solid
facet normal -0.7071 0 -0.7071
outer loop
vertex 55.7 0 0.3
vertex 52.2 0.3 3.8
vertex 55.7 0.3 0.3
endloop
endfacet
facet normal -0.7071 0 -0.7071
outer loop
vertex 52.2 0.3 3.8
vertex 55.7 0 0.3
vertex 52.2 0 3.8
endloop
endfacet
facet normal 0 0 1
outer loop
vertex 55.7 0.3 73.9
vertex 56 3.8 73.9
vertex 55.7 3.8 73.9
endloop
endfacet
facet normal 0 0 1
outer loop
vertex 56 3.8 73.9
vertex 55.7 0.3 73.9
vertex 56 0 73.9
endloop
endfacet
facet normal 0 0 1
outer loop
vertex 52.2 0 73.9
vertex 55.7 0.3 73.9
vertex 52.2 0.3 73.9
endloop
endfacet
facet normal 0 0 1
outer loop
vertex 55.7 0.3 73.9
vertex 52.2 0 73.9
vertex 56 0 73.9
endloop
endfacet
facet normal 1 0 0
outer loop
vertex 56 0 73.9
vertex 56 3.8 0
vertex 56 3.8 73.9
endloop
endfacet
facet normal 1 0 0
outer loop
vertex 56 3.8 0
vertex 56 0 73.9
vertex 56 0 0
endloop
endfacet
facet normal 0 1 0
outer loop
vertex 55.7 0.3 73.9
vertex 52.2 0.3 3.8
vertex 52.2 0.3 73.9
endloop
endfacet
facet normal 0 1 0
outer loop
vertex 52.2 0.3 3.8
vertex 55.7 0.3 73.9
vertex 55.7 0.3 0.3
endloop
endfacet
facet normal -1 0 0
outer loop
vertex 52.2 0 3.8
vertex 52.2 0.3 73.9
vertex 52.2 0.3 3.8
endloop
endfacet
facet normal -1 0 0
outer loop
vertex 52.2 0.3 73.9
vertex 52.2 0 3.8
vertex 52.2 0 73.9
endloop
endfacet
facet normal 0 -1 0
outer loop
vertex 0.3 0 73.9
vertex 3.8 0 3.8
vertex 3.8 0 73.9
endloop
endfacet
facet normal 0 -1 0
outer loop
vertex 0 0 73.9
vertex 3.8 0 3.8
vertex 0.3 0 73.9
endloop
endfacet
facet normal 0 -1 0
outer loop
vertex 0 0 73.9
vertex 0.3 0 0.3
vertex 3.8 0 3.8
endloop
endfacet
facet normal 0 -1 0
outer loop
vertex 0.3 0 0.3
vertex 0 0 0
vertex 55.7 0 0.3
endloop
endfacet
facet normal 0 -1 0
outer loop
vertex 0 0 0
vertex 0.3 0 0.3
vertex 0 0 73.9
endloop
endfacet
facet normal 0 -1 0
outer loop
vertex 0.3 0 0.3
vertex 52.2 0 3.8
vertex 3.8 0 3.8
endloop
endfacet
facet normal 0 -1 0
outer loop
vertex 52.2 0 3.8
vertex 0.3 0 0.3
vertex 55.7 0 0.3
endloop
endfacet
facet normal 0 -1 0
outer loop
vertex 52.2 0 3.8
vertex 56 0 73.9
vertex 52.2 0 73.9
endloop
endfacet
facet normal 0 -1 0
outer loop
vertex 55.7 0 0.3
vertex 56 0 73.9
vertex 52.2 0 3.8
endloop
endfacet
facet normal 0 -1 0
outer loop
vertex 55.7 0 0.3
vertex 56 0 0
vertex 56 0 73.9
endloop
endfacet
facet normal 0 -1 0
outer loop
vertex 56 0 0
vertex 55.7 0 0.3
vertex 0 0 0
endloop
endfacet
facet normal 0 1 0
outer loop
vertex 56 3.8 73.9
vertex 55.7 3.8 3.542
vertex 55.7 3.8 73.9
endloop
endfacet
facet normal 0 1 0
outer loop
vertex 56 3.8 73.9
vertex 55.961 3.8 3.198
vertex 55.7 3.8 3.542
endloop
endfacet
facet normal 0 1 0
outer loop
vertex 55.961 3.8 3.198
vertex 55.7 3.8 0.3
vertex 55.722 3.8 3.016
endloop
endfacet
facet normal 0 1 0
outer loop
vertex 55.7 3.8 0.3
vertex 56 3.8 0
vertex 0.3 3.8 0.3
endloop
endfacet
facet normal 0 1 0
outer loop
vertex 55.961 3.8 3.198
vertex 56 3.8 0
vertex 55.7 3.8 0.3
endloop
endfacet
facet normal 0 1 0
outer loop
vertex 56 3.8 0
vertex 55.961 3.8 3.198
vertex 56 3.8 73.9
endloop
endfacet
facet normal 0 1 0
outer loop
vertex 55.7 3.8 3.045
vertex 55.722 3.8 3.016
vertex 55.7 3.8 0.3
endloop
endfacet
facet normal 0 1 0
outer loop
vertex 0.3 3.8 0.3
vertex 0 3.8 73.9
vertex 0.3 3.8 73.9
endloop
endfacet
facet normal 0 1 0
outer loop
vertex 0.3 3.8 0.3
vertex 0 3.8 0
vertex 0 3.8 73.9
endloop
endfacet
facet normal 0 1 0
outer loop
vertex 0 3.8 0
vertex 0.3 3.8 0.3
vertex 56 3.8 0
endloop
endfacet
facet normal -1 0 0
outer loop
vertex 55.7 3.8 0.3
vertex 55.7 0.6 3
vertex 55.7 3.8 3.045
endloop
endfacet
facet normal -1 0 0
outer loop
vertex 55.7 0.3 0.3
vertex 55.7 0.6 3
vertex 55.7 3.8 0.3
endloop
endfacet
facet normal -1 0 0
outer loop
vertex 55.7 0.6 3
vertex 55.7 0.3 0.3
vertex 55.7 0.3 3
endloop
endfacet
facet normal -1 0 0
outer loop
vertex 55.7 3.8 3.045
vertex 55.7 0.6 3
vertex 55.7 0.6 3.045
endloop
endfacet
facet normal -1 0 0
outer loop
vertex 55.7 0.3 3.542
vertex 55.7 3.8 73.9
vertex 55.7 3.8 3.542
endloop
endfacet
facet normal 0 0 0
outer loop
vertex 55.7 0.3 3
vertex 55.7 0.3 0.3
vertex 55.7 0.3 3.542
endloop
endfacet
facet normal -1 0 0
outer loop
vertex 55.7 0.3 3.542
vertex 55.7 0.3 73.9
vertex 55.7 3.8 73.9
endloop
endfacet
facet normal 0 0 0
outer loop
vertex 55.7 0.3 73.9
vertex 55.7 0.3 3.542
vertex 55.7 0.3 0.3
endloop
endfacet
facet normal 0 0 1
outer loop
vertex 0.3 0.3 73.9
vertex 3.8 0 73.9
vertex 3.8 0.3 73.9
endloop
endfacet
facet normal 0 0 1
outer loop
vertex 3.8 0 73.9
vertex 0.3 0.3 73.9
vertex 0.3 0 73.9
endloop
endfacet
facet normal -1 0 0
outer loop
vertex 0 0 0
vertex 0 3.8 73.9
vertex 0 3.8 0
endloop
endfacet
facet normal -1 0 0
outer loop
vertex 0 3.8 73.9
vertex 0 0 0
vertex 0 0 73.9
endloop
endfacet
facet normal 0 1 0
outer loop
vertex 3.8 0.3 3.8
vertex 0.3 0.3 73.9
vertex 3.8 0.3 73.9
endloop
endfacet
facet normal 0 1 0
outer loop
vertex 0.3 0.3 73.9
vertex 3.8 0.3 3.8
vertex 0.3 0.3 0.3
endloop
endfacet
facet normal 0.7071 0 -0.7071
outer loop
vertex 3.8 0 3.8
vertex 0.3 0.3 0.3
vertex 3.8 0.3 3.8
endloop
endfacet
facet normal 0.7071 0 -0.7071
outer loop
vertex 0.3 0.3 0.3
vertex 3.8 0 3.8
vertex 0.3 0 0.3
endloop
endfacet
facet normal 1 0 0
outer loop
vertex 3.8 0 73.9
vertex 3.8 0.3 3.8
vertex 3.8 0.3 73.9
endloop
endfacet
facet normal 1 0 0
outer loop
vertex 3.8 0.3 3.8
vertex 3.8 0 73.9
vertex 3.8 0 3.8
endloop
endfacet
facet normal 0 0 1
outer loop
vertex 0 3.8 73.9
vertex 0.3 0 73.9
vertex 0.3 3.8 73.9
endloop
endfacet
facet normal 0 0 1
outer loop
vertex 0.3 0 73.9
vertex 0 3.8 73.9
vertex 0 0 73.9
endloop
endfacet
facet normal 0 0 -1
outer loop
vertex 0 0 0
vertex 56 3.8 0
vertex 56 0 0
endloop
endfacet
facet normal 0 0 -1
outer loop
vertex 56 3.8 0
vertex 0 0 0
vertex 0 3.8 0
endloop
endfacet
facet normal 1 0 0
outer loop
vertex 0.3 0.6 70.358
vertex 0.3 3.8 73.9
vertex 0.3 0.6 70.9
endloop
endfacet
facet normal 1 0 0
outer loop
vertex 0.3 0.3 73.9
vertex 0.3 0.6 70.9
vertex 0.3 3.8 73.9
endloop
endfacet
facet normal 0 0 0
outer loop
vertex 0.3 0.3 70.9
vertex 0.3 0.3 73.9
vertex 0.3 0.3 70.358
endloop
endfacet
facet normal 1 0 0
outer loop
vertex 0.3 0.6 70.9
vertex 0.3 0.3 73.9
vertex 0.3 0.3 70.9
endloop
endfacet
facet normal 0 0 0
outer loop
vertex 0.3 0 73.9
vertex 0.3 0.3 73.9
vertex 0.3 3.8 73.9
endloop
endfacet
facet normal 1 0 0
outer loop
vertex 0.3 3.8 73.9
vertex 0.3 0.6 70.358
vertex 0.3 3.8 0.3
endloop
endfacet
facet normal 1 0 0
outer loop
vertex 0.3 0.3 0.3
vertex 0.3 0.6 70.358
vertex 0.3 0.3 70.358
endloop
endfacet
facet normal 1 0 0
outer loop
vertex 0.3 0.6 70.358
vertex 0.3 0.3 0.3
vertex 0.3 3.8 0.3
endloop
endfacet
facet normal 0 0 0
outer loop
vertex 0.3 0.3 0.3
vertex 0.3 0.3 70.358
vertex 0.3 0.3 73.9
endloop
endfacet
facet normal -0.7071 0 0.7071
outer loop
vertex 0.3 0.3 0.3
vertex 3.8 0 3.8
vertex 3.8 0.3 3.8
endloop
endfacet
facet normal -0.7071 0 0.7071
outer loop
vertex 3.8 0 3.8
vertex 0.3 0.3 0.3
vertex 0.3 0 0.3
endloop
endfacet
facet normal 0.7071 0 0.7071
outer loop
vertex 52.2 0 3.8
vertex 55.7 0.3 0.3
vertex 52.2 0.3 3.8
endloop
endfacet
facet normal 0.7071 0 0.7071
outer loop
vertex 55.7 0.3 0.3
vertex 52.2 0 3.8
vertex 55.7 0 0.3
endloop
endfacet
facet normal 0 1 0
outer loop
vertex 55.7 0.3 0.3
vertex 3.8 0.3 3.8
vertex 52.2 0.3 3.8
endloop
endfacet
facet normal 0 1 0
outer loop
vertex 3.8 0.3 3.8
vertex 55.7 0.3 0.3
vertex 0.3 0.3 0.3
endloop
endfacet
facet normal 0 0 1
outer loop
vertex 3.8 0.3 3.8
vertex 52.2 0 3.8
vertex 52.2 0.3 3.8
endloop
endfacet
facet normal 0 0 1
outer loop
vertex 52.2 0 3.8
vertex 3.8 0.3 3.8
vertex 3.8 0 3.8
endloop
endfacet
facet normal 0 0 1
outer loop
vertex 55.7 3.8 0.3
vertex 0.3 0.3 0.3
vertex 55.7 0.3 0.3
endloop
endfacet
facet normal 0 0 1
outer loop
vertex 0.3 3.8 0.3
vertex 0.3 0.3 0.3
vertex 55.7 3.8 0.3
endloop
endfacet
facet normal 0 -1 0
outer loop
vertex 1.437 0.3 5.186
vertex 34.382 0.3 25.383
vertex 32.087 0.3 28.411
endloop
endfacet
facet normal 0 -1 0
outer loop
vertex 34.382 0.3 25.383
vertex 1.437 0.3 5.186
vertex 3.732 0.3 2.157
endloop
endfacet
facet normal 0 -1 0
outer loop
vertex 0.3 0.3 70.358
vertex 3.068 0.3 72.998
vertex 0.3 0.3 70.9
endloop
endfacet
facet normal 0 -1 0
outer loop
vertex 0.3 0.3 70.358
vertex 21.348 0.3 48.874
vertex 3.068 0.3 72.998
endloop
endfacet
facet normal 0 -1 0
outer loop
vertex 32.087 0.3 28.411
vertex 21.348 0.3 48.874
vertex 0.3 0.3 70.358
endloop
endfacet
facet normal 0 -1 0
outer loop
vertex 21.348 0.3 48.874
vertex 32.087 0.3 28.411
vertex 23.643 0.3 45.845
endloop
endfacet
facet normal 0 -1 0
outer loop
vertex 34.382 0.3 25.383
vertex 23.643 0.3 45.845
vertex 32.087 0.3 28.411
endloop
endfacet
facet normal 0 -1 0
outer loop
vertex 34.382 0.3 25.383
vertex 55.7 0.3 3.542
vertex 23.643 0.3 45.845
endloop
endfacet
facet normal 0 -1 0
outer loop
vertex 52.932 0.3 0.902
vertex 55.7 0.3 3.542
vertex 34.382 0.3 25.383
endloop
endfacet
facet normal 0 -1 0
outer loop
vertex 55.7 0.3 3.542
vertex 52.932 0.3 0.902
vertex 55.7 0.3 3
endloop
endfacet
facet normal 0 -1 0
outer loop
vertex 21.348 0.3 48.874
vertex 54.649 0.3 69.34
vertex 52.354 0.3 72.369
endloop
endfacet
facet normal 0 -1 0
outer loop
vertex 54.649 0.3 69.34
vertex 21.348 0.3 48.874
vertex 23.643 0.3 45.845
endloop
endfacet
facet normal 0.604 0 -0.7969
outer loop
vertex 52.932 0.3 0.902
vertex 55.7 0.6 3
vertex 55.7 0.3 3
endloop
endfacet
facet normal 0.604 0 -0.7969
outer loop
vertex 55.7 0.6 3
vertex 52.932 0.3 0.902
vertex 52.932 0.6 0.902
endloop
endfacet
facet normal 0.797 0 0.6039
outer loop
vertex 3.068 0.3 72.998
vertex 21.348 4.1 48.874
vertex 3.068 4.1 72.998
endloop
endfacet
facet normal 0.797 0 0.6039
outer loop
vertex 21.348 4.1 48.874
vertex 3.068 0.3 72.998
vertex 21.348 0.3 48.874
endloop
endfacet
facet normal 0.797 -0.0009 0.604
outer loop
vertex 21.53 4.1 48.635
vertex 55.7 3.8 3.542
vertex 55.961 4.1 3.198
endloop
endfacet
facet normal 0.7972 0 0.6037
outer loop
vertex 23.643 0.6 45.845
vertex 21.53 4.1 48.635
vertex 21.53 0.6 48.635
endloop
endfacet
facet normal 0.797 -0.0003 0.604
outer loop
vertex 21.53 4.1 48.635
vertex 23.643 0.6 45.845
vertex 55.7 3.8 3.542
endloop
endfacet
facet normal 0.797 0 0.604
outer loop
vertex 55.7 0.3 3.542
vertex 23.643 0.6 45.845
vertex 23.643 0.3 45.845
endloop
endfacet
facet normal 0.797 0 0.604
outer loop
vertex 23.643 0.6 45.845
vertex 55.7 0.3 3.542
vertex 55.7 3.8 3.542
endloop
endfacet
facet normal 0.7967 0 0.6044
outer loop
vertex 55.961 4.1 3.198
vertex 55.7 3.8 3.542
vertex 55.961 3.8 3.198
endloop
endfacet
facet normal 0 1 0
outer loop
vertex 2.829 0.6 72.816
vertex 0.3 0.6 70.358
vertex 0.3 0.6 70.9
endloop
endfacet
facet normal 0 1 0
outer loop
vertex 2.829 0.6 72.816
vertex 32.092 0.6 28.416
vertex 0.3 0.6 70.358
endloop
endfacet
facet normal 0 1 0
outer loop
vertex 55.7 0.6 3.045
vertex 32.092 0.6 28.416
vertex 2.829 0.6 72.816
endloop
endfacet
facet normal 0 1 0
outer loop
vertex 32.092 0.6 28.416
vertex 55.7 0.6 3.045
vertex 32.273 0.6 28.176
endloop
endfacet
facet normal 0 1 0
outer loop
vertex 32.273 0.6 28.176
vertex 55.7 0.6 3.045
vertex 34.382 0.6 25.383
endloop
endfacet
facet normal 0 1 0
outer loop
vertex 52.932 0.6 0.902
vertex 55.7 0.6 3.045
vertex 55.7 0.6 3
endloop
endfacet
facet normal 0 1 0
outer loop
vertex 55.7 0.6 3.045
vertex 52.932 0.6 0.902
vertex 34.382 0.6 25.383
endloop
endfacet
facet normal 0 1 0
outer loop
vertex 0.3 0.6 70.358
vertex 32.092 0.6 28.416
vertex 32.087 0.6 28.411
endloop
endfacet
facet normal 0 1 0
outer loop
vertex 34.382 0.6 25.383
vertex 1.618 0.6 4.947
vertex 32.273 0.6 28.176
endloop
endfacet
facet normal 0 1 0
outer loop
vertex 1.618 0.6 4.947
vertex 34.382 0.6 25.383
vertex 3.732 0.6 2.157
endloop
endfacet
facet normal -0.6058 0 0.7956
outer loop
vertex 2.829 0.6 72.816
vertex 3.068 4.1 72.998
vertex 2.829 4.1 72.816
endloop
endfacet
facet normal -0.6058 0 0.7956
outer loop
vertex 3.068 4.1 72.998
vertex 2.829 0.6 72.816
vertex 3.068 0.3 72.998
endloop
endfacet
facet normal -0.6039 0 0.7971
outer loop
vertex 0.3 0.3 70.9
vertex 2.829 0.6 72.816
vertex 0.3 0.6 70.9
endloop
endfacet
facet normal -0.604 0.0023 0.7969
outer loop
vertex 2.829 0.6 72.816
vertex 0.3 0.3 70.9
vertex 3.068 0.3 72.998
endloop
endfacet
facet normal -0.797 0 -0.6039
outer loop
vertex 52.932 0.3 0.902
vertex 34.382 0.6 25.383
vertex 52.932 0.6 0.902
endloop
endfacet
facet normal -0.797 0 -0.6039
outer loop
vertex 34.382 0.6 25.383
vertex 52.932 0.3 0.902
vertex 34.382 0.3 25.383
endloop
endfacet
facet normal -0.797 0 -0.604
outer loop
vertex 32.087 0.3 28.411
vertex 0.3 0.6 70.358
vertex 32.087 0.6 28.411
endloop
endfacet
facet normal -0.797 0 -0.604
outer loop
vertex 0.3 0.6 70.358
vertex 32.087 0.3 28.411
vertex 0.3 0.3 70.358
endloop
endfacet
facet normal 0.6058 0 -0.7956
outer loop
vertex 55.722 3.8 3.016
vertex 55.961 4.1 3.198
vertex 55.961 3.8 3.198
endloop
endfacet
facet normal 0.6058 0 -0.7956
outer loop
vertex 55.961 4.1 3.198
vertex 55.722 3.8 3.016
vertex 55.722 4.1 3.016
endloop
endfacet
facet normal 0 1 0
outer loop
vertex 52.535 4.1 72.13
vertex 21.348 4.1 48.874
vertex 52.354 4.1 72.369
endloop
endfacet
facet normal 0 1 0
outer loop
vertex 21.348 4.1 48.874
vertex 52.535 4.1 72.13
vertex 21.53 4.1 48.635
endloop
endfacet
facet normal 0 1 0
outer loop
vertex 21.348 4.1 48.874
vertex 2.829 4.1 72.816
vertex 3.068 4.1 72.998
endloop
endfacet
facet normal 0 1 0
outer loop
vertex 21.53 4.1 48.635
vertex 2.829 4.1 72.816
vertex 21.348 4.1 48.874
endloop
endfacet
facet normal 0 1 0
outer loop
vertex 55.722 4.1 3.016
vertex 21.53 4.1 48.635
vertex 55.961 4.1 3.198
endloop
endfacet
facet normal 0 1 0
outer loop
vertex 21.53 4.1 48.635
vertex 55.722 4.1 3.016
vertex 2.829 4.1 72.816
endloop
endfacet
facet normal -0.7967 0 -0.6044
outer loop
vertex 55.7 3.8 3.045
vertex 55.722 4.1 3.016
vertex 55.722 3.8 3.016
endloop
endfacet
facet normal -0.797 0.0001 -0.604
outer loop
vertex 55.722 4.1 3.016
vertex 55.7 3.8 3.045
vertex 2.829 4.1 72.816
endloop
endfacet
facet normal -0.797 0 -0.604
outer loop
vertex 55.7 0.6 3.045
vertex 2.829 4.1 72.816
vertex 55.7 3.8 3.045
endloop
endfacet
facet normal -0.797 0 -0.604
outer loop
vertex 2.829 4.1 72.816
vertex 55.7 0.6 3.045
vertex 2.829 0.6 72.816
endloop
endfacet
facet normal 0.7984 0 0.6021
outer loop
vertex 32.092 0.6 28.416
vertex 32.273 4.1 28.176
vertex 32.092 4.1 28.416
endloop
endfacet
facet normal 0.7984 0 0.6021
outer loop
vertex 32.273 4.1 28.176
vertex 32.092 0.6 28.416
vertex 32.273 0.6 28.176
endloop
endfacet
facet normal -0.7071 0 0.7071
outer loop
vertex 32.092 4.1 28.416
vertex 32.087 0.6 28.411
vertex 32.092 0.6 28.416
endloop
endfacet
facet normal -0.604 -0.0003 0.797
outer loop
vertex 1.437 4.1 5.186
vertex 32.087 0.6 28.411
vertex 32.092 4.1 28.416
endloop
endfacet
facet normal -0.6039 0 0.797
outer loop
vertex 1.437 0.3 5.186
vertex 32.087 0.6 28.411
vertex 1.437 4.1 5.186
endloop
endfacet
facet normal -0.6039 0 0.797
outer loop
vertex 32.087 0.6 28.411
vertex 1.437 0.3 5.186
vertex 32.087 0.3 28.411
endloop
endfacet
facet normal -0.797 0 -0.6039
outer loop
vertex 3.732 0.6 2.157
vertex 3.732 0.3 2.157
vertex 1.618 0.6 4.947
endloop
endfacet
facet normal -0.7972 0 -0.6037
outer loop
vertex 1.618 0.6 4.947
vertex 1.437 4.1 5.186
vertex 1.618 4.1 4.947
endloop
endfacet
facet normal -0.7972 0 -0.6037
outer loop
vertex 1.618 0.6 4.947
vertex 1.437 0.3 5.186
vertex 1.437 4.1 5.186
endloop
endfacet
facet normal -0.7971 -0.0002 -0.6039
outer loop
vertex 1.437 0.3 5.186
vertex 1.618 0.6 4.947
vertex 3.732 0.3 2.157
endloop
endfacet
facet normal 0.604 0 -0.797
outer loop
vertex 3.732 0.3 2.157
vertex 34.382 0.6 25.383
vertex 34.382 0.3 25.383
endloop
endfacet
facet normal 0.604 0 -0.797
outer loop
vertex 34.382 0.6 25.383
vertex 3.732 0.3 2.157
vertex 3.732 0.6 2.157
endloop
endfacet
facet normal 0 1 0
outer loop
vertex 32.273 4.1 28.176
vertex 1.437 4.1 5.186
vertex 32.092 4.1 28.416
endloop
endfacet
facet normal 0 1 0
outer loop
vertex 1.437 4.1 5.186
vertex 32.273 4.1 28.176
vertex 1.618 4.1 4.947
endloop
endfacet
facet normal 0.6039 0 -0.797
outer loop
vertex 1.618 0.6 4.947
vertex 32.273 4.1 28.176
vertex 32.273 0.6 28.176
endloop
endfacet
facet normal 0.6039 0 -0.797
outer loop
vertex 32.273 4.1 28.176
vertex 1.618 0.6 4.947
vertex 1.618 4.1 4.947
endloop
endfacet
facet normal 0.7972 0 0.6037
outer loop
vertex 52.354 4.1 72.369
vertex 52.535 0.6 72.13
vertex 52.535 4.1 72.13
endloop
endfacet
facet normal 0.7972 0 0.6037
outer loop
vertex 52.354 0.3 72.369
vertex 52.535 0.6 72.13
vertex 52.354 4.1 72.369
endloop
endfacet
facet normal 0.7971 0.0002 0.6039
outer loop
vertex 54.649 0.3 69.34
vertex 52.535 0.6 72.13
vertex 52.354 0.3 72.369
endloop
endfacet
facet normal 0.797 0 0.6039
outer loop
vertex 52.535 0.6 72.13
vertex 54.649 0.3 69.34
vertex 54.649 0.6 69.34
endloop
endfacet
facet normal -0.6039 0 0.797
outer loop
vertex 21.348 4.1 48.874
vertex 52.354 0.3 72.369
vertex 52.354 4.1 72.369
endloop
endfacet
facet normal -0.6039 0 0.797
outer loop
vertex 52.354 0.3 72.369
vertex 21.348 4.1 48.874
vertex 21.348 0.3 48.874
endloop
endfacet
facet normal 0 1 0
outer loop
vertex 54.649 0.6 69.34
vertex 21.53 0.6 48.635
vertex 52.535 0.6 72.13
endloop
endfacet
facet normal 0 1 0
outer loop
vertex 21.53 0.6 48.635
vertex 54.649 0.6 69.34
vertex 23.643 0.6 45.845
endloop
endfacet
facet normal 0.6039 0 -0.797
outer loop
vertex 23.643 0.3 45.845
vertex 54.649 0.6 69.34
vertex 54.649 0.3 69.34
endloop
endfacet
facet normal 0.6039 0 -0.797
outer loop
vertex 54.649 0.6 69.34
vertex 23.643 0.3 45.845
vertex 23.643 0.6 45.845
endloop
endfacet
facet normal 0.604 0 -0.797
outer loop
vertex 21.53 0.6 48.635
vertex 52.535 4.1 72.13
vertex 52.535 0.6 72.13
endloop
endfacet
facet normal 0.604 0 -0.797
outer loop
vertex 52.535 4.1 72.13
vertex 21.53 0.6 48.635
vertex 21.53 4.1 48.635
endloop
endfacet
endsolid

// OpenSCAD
// file: ../hdim.scad
module hdim(x1 = 10, x2 = 20, y = 10, dimline_lenght = 9.0) 
{
    dimline_overlap = 0.5;
    dimline_width = 0.3;
    text_size = 2;
    tmp = 2*dimline_overlap+text_size/2;
    text_pos = dimline_lenght>0 ? tmp : -tmp; 
    dimline_abs = dimline_lenght>0 ? dimline_lenght : -dimline_lenght;
    
    color([0,0,0])
    {
        translate([x1,y-dimline_lenght/2,0]) 
            square([dimline_width, 
                dimline_abs + 2*dimline_overlap], 
                center=true, $fs=0.01);
                
        translate([x2,y-dimline_lenght/2,0]) 
            square([dimline_width, 
                dimline_abs + 2*dimline_overlap], 
                center=true, $fs=0.01);

        translate([(x1+x2)/2,y-dimline_lenght,0]) 
            square([x2-x1, 
                dimline_width], 
                center=true, $fs=0.01);
    }
        
    translate([(x1+x2)/2,y-dimline_lenght-text_pos,0]) 
    {
        color([0,0,0])
        cube([text_size * 5, 1.2*text_size, 0.9], center=true);
        
        color([0.8,0.8,0.5,1.0])
        {
            translate([0,0,0.2])
            text(str(0.1*round((x2-x1)*10)), size = text_size, 
                halign = "center",valign = "center");
            translate([0,0,-0.2])
            rotate([0,180,0])
            text(str(0.1*round((x2-x1)*10)), size = text_size, 
                halign = "center",valign = "center");
        }
    }
}

hdim();
// main file
use <../hdim.scad> 


bar_t  = 0.3;

module tableleg(height = 73.9, width = 56, bar_diam = 3.8, dimensions=true, explode=false, c1 = [0.5,0.28,0.19, 1.0], c2 = [0.8,0.30,0.29, 1.0])
{
    d = explode ? 20 : 0;
   
    
    translate([width,0,0])
    rotate([0,90,90])
    {
    translate([-height,-d,0]) 
    tl_anglebar(height, bar_diam, c1, straight1=true, dims=dimensions);
    translate([0,width+d,0]) 
    rotate([0,0,180])
    tl_anglebar(height, bar_diam, c1, straight2=true, dims=dimensions);
    translate([d,0,0]) 
    rotate([0,0,90])
    tl_anglebar(width, bar_diam, c2, dims=dimensions);
    angle = atan2(width, height);
    len = sqrt(width*width+height*height) - (bar_diam+bar_t)/cos(angle);
    translate([-height/2,width/2,bar_t]) 
    rotate([0,0,-angle])
    translate([-len/2,-bar_diam/2,0]) 
    tl_anglebar(len, bar_diam, c2, straight1=true, straight2=true, dims=dimensions);

    
    hyp = width - 1.41*bar_diam;
    angle2 = -angle+90;
    cat1 = sin(angle)*hyp;
    cat2 = cos(angle)*hyp;
    len2 = cat2 - bar_diam/2;
    
    dx = cat1*cos(angle);
    dy = cat1*sin(angle)+1.25*bar_diam/2;
    translate([-dx,dy,bar_t]) 
    rotate([0,0, angle2])
    translate([len2,4*bar_diam/3,0]) 
    rotate([0,0,180])
    tl_anglebar(len2, bar_diam, c2, straight1=true, straight2=true, dims=dimensions);

    dx2 = height-dx-bar_diam/2-bar_t;
    dy2 = width-dy-bar_diam/2+bar_t;
    translate([-dx2,dy2,bar_t]) 
    rotate([0,0, angle2])
    translate([0,bar_diam/2,0]) 
     rotate([0,0,180])
    tl_anglebar(len2+0.5,bar_diam, c2,straight1=true, straight2=true, dims=dimensions);
    }
}        

module tl_anglebar(height, bar_diam, c, straight1=false, straight2=false, dims=true)
{
   color(c)
    {
        linear_extrude(bar_t) 
        polygon(points=[[0,0],
            [straight1?0:bar_diam, bar_diam],
            [straight2?height:height-bar_diam, bar_diam],
            [height, 0], [0,0]]);
 
        cube([height, bar_t, bar_diam]);
    }
    
    if (dims) {
        hdim(x1 = 0, x2 = height, y = 0, dimline_lenght = 5);
    }
}   


tableleg();
